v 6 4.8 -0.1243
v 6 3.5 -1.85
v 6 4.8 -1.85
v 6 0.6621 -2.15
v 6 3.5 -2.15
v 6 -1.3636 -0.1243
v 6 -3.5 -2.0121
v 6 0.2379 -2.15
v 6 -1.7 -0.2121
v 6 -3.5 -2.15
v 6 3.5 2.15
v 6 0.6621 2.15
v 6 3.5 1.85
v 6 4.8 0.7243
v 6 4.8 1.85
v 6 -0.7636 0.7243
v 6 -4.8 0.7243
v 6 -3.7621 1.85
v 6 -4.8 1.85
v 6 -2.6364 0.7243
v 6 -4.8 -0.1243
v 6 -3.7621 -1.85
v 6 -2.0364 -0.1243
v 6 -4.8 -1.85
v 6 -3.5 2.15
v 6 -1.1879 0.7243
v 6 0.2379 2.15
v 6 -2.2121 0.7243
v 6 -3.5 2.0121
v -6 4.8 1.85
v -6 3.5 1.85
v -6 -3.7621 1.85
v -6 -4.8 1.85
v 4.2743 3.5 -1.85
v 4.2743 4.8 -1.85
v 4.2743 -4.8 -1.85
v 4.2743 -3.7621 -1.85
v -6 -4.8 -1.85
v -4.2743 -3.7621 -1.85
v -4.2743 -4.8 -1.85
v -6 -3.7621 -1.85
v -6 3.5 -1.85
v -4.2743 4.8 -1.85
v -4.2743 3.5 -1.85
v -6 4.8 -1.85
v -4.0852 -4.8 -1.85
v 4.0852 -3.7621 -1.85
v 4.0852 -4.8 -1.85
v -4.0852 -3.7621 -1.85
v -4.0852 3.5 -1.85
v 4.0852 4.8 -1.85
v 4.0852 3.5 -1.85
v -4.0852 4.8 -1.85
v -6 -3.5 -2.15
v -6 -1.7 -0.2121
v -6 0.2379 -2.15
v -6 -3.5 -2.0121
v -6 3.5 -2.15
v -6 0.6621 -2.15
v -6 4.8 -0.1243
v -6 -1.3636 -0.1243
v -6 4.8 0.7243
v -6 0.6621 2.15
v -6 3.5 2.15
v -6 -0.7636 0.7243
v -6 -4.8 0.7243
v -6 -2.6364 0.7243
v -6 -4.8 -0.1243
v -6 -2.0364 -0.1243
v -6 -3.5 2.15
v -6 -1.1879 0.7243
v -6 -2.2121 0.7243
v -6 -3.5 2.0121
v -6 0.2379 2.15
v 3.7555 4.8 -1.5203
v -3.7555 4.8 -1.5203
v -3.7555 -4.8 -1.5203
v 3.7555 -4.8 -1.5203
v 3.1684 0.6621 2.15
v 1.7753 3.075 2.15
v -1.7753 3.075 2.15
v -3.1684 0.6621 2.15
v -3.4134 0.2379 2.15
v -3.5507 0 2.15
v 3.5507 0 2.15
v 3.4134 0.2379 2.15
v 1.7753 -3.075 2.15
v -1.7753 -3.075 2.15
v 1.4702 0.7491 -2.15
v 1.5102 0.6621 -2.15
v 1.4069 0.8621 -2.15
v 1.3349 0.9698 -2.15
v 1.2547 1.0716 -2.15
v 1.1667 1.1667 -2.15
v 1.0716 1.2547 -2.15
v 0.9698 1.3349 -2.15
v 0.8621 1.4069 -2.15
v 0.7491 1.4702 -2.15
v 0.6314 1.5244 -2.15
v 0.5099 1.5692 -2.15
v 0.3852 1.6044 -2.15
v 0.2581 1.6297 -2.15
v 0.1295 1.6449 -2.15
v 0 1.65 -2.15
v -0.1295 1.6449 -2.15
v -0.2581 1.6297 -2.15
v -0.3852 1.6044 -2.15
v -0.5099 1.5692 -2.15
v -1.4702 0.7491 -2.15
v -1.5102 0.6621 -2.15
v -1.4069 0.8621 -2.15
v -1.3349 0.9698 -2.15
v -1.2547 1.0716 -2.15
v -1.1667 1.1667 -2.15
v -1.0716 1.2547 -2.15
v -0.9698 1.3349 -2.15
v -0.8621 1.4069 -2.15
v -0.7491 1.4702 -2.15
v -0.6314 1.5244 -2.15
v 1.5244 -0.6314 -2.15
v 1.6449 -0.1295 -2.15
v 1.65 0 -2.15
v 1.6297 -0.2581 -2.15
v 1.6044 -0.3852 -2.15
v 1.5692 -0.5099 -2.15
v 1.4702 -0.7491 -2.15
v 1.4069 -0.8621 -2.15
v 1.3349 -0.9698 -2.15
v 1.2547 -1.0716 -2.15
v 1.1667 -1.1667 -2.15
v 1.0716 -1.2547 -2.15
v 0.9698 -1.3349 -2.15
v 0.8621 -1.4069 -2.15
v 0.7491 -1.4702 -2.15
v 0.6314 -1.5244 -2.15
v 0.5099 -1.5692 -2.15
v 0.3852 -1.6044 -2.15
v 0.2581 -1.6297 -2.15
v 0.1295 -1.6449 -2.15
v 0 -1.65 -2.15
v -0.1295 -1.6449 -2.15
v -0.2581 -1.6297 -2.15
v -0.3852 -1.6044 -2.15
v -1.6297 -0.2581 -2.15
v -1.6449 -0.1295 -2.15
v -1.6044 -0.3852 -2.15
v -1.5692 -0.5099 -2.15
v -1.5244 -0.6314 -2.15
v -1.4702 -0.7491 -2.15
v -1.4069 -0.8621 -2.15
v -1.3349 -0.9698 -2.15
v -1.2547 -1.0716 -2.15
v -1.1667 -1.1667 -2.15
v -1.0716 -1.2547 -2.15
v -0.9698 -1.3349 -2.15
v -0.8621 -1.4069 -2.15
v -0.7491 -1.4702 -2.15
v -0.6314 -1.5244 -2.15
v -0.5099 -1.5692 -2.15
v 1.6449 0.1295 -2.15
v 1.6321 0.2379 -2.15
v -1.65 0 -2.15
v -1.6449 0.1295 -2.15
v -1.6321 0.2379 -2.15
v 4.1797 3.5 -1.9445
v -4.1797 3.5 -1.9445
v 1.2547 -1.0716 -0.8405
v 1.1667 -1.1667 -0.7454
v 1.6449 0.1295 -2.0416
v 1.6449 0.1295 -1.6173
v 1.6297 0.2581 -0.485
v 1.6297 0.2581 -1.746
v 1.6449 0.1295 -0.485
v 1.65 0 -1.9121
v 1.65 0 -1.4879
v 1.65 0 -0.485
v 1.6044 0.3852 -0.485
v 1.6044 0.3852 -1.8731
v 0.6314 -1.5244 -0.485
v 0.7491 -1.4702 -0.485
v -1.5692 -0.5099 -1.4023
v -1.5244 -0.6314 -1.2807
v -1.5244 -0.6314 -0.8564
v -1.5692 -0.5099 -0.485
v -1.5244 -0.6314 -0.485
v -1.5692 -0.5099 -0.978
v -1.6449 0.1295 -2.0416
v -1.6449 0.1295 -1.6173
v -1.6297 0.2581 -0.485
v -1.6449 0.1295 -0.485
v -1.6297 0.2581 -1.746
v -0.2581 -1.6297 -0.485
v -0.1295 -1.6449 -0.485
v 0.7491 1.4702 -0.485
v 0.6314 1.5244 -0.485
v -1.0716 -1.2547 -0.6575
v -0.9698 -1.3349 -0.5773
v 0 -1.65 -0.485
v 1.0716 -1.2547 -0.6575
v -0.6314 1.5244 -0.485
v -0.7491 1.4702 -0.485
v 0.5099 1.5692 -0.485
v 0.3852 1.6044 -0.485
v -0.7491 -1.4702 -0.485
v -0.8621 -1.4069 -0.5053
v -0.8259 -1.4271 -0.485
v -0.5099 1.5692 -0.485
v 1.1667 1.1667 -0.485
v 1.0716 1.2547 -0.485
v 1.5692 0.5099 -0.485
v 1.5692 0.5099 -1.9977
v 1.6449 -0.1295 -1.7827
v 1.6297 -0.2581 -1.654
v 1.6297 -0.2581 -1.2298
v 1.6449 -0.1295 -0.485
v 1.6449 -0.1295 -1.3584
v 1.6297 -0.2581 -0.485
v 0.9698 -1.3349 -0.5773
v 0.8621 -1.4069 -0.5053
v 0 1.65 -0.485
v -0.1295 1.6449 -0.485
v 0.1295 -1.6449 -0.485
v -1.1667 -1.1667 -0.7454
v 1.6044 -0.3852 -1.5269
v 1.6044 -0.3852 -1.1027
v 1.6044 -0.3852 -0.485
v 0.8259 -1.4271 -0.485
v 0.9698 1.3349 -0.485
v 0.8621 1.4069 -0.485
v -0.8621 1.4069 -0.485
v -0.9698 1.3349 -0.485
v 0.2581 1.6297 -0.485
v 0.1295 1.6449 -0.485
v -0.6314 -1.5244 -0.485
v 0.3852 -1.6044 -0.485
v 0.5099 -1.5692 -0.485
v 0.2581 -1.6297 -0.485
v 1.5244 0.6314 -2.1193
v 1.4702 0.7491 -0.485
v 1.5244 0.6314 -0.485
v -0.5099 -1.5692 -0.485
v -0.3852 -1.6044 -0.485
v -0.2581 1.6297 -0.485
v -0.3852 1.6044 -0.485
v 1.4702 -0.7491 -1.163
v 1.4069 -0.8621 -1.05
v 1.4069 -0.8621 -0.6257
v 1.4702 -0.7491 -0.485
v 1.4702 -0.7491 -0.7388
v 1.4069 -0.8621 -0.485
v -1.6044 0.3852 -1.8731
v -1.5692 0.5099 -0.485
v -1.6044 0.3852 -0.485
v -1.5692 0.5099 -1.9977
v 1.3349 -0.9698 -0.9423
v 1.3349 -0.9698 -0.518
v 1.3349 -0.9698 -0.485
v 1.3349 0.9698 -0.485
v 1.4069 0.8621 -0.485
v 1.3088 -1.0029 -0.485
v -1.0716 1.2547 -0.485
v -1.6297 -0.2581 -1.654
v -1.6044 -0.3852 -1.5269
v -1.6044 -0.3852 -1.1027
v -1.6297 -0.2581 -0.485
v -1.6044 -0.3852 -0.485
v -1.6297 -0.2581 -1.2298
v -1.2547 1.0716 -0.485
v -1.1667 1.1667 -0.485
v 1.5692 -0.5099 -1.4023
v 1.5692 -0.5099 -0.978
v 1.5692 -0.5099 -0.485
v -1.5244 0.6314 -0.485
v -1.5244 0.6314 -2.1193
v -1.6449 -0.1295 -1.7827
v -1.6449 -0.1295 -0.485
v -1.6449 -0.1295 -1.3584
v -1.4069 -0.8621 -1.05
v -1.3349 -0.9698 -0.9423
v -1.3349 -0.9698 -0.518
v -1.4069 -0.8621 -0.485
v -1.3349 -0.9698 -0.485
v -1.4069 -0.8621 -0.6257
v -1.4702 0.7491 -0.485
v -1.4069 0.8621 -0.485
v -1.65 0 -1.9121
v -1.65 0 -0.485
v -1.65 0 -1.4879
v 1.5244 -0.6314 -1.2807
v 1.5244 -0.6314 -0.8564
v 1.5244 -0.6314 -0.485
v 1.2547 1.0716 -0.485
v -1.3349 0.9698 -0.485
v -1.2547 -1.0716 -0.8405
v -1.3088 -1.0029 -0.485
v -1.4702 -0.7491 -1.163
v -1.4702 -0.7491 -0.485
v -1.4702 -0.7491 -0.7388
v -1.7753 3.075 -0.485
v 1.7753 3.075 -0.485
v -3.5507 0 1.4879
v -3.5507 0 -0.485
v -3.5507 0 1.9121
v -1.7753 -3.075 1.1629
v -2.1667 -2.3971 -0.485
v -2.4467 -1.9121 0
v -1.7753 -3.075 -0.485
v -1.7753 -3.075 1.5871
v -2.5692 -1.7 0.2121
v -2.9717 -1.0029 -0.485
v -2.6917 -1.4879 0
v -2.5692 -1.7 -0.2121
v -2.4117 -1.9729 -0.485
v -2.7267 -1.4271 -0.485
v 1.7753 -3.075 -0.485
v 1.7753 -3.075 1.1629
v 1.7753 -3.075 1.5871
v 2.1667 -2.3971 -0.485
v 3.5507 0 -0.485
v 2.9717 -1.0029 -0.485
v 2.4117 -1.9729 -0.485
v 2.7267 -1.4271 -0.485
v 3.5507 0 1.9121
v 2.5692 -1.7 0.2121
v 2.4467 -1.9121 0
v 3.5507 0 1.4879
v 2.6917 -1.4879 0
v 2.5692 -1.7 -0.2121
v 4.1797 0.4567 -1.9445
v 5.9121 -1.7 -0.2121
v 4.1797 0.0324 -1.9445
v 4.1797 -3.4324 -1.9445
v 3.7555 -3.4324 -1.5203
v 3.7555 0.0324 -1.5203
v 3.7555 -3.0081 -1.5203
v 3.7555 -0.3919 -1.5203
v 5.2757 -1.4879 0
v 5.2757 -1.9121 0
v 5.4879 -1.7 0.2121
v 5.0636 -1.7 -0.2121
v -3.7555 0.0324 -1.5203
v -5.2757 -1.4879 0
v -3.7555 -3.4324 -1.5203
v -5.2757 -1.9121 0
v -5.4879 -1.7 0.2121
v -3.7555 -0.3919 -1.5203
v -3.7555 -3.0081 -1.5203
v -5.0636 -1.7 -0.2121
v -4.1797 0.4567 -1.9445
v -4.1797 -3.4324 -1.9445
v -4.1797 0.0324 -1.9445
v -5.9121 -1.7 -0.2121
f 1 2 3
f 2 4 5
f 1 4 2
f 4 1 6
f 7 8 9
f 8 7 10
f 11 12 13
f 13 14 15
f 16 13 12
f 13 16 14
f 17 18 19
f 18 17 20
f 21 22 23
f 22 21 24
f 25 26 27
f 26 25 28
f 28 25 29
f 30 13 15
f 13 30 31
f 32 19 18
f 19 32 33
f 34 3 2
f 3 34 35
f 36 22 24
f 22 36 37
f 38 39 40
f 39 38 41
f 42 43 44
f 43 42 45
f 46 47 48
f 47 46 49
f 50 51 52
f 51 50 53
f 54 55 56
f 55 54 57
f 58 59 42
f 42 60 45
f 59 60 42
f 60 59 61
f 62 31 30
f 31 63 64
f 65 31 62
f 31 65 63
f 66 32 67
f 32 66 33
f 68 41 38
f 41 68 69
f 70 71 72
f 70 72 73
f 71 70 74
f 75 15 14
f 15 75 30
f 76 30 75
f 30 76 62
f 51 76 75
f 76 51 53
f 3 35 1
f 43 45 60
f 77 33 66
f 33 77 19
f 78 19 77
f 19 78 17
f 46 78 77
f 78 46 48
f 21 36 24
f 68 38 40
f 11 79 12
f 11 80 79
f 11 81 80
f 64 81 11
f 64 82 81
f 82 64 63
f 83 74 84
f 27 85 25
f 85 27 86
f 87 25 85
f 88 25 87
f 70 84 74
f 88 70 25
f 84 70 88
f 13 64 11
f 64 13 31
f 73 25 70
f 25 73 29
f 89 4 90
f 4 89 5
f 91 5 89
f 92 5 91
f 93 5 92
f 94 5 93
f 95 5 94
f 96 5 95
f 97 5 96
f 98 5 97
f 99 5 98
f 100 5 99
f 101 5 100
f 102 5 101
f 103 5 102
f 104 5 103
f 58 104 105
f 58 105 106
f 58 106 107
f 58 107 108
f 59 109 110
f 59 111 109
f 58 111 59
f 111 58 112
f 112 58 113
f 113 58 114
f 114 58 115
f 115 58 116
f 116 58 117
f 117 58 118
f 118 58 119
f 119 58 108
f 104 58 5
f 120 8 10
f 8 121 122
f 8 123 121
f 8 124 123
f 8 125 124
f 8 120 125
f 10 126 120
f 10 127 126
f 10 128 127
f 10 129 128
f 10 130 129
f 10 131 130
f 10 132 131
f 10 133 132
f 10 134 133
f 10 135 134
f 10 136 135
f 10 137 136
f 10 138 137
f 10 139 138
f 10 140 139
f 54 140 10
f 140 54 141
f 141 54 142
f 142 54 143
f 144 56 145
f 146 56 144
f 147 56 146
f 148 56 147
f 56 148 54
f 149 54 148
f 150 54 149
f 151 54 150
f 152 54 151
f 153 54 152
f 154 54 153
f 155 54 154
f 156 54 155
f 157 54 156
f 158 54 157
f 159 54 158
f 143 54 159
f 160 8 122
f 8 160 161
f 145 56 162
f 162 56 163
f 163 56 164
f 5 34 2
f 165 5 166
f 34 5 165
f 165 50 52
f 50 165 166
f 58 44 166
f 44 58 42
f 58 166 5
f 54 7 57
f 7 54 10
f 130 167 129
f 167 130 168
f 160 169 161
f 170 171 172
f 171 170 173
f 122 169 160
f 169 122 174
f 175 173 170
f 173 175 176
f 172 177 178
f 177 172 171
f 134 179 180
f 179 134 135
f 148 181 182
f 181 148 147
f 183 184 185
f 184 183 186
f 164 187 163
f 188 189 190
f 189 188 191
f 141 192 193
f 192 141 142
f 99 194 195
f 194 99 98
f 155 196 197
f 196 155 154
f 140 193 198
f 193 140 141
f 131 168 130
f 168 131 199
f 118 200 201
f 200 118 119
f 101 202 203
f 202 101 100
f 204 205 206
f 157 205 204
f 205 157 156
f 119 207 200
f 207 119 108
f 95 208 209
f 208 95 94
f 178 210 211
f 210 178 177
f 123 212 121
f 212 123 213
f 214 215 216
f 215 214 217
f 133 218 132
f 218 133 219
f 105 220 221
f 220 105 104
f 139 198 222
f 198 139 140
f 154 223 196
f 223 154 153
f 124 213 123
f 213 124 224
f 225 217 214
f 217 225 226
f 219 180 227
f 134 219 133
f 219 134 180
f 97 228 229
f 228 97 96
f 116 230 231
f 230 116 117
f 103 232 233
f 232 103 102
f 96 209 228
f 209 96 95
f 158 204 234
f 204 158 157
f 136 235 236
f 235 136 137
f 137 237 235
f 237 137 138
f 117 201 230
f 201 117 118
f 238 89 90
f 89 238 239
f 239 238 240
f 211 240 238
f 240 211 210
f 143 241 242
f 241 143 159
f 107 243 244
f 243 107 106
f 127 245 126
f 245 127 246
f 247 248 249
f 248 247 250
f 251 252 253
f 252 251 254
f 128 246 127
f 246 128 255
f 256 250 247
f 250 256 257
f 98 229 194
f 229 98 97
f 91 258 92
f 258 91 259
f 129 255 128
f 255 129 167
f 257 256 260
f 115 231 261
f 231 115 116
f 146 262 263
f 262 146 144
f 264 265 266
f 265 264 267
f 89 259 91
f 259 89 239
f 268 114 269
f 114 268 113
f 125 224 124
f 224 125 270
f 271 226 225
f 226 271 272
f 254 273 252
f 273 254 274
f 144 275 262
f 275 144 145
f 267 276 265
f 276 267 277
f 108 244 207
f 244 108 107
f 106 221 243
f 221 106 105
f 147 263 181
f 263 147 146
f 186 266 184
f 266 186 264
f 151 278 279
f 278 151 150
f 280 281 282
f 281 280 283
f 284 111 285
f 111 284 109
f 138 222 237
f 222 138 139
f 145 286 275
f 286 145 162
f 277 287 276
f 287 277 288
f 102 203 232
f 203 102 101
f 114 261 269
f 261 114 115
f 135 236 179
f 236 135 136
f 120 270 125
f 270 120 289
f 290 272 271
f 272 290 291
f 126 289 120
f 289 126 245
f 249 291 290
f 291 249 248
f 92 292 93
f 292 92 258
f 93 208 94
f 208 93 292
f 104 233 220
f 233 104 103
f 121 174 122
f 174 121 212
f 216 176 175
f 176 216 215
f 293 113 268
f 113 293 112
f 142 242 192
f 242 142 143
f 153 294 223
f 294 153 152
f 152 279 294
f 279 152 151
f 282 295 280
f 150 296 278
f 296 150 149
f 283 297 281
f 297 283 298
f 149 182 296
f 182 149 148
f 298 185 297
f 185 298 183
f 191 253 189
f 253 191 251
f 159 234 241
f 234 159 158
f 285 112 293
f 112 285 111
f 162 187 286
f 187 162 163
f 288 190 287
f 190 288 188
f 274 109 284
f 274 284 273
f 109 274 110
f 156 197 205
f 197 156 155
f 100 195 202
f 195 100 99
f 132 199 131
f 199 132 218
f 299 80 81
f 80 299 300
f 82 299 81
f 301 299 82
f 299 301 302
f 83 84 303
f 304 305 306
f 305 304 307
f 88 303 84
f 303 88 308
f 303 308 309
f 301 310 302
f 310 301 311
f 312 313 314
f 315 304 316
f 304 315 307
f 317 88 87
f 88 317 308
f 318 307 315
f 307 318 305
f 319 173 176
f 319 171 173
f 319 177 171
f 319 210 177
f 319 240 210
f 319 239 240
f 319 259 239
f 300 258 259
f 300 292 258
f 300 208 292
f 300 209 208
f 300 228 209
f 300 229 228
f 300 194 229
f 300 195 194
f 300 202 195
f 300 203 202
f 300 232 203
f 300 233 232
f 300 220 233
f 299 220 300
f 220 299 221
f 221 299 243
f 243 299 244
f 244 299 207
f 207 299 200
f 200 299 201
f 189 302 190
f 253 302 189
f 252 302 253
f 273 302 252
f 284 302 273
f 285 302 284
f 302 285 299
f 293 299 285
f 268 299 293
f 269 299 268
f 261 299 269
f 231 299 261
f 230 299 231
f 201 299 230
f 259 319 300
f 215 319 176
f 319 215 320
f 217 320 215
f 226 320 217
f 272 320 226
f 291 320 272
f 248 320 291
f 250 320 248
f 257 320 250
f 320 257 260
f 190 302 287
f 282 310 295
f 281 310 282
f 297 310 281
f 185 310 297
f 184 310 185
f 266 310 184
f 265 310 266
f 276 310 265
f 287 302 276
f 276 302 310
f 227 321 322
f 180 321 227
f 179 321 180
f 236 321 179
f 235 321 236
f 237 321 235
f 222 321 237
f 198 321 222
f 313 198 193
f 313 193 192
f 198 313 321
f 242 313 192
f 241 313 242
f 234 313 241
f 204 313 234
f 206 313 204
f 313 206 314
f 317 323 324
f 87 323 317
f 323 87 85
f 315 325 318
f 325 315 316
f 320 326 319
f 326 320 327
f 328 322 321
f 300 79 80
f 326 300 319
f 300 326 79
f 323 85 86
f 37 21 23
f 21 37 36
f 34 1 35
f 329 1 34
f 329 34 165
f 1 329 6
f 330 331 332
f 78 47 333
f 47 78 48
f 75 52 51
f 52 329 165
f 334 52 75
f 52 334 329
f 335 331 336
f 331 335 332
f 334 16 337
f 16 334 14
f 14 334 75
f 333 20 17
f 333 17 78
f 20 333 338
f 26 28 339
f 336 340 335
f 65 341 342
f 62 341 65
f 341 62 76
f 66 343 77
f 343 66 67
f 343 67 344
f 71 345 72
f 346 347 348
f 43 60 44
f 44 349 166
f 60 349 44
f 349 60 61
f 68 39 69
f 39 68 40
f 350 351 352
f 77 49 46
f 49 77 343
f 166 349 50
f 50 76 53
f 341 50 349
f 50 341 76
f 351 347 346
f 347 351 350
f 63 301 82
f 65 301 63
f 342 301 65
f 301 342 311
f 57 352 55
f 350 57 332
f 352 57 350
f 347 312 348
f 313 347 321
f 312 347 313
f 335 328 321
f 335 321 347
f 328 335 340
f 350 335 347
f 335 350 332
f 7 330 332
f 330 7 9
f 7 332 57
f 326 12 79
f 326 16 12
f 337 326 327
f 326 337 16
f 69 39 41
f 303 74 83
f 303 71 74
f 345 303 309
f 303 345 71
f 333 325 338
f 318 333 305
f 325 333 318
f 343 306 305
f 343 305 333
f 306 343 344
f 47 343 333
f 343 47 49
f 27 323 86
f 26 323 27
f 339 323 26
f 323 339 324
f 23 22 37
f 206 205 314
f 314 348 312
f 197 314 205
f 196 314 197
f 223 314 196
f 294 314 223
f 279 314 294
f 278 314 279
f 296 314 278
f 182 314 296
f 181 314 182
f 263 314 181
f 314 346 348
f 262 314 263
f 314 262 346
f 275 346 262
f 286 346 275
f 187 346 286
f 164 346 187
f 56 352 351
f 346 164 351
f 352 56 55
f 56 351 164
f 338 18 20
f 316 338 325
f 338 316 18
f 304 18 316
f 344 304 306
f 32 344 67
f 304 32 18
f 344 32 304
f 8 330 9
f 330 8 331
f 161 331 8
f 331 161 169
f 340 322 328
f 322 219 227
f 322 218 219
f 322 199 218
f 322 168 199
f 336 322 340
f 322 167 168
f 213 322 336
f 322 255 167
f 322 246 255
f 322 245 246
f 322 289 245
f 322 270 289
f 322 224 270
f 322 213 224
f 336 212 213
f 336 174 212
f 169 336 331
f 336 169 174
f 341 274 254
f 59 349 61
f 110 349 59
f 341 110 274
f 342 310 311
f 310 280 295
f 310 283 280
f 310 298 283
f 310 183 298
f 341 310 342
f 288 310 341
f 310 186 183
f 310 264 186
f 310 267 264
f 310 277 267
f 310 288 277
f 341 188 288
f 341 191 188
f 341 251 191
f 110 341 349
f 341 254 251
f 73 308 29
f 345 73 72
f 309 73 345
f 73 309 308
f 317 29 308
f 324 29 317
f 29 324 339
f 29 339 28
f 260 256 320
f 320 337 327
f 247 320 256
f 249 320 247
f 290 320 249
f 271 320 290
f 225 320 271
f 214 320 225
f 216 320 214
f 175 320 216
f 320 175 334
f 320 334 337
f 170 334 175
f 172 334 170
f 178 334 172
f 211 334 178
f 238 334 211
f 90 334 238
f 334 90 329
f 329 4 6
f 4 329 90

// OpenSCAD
$fn = 80;

// Requested key dimensions
screw_nominal_diameter_mm = 4.0;          // M4
across_flats_mm           = 6.0;          // hex pocket AF
thickness_mm              = 3.7;          // overall nut thickness

// Typical sliding T-slot nut proportions (parametric)
nut_overall_length_mm = 12.0;
nut_overall_width_mm  = 9.6;

// Slot interface (adjust to your extrusion/slot)
t_slot_neck_width_mm  = 6.0;              // neck opening
lip_thickness_mm      = 0.8;              // each lip thickness
lip_width_extra_mm    = 1.2;              // lips wider than neck by this amount (total)
tolerances_mm         = 0.2;              // fit allowance

// Hole sizing
tap_drill_diameter_mm       = 3.3;        // for M4 tapping
clearance_hole_diameter_mm  = 4.3;
use_clearance_hole          = 0;          // 0=tap drill, 1=clearance
effective_hole_diameter_mm  = use_clearance_hole ? clearance_hole_diameter_mm : tap_drill_diameter_mm;

// Detailing
entry_chamfer_mm  = 0.6;
corner_chamfer_mm = 0.3;
overlap_mm        = 0.6;

// Helpers
function hex_radius_from_af(af) = af / sqrt(3); // circumradius for a hex with given across-flats

module hex2d(af){
    r = hex_radius_from_af(af);
    polygon([ for (i=[0:5]) [ r*cos(60*i), r*sin(60*i) ] ]);
}

module tslot_nut(){
    // Lip width (in Y) that engages the slot undercut
    lip_w = max(t_slot_neck_width_mm, t_slot_neck_width_mm + lip_width_extra_mm - tolerances_mm);

    // Body width must be >= lip width so lips are not "floating" outside the body
    body_w = max(nut_overall_width_mm, lip_w);

    // Ensure lips do not exceed thickness
    lip_t = min(lip_thickness_mm, thickness_mm/2 - 0.05);

    // Main solid (single connected body)
    difference(){
        union(){
            // Main rectangular body
            cube([nut_overall_length_mm, body_w, thickness_mm], center=true);

            // Retention lips: make them slightly thicker than lip_t and overlap into body
            // so they are guaranteed connected and not coplanar artifacts.
            lip_h = lip_t + overlap_mm;

            translate([0, 0,  thickness_mm/2 - lip_t/2])
                cube([nut_overall_length_mm, lip_w, lip_h], center=true);

            translate([0, 0, -thickness_mm/2 + lip_t/2])
                cube([nut_overall_length_mm, lip_w, lip_h], center=true);
        }

        // Central through-hole for M4 (tap drill or clearance)
        cylinder(d=effective_hole_diameter_mm, h=thickness_mm + 2*overlap_mm, center=true);

        // Hex pocket on the TOP face (across flats = 6.0mm)
        // Keep some material under the pocket.
        min_floor = 0.8;
        hex_depth = max(0.6, min(thickness_mm - min_floor, thickness_mm*0.55));
        translate([0, 0, thickness_mm/2 - hex_depth/2])
            linear_extrude(height=hex_depth + overlap_mm, center=true)
                hex2d(across_flats_mm + 0.15);

        // End chamfers (computed placement; no arbitrary offsets)
        chamfer_len = min(entry_chamfer_mm, nut_overall_length_mm/4);

        translate([ nut_overall_length_mm/2 - chamfer_len/2, 0, 0])
            rotate([0, 45, 0])
                cube([chamfer_len, body_w + 2*overlap_mm, thickness_mm + 2*overlap_mm], center=true);

        translate([-nut_overall_length_mm/2 + chamfer_len/2, 0, 0])
            rotate([0,-45, 0])
                cube([chamfer_len, body_w + 2*overlap_mm, thickness_mm + 2*overlap_mm], center=true);

        // Small edge breaks (top/bottom) - keep subtle to avoid slicing the body into artifacts
        edge_break = min(corner_chamfer_mm, thickness_mm/4);
        translate([0, 0,  thickness_mm/2 - edge_break/2])
            rotate([45, 0, 0])
                cube([nut_overall_length_mm + 2*overlap_mm, body_w + 2*overlap_mm, edge_break], center=true);

        translate([0, 0, -thickness_mm/2 + edge_break/2])
            rotate([-45, 0, 0])
                cube([nut_overall_length_mm + 2*overlap_mm, body_w + 2*overlap_mm, edge_break], center=true);
    }
}

tslot_nut();
